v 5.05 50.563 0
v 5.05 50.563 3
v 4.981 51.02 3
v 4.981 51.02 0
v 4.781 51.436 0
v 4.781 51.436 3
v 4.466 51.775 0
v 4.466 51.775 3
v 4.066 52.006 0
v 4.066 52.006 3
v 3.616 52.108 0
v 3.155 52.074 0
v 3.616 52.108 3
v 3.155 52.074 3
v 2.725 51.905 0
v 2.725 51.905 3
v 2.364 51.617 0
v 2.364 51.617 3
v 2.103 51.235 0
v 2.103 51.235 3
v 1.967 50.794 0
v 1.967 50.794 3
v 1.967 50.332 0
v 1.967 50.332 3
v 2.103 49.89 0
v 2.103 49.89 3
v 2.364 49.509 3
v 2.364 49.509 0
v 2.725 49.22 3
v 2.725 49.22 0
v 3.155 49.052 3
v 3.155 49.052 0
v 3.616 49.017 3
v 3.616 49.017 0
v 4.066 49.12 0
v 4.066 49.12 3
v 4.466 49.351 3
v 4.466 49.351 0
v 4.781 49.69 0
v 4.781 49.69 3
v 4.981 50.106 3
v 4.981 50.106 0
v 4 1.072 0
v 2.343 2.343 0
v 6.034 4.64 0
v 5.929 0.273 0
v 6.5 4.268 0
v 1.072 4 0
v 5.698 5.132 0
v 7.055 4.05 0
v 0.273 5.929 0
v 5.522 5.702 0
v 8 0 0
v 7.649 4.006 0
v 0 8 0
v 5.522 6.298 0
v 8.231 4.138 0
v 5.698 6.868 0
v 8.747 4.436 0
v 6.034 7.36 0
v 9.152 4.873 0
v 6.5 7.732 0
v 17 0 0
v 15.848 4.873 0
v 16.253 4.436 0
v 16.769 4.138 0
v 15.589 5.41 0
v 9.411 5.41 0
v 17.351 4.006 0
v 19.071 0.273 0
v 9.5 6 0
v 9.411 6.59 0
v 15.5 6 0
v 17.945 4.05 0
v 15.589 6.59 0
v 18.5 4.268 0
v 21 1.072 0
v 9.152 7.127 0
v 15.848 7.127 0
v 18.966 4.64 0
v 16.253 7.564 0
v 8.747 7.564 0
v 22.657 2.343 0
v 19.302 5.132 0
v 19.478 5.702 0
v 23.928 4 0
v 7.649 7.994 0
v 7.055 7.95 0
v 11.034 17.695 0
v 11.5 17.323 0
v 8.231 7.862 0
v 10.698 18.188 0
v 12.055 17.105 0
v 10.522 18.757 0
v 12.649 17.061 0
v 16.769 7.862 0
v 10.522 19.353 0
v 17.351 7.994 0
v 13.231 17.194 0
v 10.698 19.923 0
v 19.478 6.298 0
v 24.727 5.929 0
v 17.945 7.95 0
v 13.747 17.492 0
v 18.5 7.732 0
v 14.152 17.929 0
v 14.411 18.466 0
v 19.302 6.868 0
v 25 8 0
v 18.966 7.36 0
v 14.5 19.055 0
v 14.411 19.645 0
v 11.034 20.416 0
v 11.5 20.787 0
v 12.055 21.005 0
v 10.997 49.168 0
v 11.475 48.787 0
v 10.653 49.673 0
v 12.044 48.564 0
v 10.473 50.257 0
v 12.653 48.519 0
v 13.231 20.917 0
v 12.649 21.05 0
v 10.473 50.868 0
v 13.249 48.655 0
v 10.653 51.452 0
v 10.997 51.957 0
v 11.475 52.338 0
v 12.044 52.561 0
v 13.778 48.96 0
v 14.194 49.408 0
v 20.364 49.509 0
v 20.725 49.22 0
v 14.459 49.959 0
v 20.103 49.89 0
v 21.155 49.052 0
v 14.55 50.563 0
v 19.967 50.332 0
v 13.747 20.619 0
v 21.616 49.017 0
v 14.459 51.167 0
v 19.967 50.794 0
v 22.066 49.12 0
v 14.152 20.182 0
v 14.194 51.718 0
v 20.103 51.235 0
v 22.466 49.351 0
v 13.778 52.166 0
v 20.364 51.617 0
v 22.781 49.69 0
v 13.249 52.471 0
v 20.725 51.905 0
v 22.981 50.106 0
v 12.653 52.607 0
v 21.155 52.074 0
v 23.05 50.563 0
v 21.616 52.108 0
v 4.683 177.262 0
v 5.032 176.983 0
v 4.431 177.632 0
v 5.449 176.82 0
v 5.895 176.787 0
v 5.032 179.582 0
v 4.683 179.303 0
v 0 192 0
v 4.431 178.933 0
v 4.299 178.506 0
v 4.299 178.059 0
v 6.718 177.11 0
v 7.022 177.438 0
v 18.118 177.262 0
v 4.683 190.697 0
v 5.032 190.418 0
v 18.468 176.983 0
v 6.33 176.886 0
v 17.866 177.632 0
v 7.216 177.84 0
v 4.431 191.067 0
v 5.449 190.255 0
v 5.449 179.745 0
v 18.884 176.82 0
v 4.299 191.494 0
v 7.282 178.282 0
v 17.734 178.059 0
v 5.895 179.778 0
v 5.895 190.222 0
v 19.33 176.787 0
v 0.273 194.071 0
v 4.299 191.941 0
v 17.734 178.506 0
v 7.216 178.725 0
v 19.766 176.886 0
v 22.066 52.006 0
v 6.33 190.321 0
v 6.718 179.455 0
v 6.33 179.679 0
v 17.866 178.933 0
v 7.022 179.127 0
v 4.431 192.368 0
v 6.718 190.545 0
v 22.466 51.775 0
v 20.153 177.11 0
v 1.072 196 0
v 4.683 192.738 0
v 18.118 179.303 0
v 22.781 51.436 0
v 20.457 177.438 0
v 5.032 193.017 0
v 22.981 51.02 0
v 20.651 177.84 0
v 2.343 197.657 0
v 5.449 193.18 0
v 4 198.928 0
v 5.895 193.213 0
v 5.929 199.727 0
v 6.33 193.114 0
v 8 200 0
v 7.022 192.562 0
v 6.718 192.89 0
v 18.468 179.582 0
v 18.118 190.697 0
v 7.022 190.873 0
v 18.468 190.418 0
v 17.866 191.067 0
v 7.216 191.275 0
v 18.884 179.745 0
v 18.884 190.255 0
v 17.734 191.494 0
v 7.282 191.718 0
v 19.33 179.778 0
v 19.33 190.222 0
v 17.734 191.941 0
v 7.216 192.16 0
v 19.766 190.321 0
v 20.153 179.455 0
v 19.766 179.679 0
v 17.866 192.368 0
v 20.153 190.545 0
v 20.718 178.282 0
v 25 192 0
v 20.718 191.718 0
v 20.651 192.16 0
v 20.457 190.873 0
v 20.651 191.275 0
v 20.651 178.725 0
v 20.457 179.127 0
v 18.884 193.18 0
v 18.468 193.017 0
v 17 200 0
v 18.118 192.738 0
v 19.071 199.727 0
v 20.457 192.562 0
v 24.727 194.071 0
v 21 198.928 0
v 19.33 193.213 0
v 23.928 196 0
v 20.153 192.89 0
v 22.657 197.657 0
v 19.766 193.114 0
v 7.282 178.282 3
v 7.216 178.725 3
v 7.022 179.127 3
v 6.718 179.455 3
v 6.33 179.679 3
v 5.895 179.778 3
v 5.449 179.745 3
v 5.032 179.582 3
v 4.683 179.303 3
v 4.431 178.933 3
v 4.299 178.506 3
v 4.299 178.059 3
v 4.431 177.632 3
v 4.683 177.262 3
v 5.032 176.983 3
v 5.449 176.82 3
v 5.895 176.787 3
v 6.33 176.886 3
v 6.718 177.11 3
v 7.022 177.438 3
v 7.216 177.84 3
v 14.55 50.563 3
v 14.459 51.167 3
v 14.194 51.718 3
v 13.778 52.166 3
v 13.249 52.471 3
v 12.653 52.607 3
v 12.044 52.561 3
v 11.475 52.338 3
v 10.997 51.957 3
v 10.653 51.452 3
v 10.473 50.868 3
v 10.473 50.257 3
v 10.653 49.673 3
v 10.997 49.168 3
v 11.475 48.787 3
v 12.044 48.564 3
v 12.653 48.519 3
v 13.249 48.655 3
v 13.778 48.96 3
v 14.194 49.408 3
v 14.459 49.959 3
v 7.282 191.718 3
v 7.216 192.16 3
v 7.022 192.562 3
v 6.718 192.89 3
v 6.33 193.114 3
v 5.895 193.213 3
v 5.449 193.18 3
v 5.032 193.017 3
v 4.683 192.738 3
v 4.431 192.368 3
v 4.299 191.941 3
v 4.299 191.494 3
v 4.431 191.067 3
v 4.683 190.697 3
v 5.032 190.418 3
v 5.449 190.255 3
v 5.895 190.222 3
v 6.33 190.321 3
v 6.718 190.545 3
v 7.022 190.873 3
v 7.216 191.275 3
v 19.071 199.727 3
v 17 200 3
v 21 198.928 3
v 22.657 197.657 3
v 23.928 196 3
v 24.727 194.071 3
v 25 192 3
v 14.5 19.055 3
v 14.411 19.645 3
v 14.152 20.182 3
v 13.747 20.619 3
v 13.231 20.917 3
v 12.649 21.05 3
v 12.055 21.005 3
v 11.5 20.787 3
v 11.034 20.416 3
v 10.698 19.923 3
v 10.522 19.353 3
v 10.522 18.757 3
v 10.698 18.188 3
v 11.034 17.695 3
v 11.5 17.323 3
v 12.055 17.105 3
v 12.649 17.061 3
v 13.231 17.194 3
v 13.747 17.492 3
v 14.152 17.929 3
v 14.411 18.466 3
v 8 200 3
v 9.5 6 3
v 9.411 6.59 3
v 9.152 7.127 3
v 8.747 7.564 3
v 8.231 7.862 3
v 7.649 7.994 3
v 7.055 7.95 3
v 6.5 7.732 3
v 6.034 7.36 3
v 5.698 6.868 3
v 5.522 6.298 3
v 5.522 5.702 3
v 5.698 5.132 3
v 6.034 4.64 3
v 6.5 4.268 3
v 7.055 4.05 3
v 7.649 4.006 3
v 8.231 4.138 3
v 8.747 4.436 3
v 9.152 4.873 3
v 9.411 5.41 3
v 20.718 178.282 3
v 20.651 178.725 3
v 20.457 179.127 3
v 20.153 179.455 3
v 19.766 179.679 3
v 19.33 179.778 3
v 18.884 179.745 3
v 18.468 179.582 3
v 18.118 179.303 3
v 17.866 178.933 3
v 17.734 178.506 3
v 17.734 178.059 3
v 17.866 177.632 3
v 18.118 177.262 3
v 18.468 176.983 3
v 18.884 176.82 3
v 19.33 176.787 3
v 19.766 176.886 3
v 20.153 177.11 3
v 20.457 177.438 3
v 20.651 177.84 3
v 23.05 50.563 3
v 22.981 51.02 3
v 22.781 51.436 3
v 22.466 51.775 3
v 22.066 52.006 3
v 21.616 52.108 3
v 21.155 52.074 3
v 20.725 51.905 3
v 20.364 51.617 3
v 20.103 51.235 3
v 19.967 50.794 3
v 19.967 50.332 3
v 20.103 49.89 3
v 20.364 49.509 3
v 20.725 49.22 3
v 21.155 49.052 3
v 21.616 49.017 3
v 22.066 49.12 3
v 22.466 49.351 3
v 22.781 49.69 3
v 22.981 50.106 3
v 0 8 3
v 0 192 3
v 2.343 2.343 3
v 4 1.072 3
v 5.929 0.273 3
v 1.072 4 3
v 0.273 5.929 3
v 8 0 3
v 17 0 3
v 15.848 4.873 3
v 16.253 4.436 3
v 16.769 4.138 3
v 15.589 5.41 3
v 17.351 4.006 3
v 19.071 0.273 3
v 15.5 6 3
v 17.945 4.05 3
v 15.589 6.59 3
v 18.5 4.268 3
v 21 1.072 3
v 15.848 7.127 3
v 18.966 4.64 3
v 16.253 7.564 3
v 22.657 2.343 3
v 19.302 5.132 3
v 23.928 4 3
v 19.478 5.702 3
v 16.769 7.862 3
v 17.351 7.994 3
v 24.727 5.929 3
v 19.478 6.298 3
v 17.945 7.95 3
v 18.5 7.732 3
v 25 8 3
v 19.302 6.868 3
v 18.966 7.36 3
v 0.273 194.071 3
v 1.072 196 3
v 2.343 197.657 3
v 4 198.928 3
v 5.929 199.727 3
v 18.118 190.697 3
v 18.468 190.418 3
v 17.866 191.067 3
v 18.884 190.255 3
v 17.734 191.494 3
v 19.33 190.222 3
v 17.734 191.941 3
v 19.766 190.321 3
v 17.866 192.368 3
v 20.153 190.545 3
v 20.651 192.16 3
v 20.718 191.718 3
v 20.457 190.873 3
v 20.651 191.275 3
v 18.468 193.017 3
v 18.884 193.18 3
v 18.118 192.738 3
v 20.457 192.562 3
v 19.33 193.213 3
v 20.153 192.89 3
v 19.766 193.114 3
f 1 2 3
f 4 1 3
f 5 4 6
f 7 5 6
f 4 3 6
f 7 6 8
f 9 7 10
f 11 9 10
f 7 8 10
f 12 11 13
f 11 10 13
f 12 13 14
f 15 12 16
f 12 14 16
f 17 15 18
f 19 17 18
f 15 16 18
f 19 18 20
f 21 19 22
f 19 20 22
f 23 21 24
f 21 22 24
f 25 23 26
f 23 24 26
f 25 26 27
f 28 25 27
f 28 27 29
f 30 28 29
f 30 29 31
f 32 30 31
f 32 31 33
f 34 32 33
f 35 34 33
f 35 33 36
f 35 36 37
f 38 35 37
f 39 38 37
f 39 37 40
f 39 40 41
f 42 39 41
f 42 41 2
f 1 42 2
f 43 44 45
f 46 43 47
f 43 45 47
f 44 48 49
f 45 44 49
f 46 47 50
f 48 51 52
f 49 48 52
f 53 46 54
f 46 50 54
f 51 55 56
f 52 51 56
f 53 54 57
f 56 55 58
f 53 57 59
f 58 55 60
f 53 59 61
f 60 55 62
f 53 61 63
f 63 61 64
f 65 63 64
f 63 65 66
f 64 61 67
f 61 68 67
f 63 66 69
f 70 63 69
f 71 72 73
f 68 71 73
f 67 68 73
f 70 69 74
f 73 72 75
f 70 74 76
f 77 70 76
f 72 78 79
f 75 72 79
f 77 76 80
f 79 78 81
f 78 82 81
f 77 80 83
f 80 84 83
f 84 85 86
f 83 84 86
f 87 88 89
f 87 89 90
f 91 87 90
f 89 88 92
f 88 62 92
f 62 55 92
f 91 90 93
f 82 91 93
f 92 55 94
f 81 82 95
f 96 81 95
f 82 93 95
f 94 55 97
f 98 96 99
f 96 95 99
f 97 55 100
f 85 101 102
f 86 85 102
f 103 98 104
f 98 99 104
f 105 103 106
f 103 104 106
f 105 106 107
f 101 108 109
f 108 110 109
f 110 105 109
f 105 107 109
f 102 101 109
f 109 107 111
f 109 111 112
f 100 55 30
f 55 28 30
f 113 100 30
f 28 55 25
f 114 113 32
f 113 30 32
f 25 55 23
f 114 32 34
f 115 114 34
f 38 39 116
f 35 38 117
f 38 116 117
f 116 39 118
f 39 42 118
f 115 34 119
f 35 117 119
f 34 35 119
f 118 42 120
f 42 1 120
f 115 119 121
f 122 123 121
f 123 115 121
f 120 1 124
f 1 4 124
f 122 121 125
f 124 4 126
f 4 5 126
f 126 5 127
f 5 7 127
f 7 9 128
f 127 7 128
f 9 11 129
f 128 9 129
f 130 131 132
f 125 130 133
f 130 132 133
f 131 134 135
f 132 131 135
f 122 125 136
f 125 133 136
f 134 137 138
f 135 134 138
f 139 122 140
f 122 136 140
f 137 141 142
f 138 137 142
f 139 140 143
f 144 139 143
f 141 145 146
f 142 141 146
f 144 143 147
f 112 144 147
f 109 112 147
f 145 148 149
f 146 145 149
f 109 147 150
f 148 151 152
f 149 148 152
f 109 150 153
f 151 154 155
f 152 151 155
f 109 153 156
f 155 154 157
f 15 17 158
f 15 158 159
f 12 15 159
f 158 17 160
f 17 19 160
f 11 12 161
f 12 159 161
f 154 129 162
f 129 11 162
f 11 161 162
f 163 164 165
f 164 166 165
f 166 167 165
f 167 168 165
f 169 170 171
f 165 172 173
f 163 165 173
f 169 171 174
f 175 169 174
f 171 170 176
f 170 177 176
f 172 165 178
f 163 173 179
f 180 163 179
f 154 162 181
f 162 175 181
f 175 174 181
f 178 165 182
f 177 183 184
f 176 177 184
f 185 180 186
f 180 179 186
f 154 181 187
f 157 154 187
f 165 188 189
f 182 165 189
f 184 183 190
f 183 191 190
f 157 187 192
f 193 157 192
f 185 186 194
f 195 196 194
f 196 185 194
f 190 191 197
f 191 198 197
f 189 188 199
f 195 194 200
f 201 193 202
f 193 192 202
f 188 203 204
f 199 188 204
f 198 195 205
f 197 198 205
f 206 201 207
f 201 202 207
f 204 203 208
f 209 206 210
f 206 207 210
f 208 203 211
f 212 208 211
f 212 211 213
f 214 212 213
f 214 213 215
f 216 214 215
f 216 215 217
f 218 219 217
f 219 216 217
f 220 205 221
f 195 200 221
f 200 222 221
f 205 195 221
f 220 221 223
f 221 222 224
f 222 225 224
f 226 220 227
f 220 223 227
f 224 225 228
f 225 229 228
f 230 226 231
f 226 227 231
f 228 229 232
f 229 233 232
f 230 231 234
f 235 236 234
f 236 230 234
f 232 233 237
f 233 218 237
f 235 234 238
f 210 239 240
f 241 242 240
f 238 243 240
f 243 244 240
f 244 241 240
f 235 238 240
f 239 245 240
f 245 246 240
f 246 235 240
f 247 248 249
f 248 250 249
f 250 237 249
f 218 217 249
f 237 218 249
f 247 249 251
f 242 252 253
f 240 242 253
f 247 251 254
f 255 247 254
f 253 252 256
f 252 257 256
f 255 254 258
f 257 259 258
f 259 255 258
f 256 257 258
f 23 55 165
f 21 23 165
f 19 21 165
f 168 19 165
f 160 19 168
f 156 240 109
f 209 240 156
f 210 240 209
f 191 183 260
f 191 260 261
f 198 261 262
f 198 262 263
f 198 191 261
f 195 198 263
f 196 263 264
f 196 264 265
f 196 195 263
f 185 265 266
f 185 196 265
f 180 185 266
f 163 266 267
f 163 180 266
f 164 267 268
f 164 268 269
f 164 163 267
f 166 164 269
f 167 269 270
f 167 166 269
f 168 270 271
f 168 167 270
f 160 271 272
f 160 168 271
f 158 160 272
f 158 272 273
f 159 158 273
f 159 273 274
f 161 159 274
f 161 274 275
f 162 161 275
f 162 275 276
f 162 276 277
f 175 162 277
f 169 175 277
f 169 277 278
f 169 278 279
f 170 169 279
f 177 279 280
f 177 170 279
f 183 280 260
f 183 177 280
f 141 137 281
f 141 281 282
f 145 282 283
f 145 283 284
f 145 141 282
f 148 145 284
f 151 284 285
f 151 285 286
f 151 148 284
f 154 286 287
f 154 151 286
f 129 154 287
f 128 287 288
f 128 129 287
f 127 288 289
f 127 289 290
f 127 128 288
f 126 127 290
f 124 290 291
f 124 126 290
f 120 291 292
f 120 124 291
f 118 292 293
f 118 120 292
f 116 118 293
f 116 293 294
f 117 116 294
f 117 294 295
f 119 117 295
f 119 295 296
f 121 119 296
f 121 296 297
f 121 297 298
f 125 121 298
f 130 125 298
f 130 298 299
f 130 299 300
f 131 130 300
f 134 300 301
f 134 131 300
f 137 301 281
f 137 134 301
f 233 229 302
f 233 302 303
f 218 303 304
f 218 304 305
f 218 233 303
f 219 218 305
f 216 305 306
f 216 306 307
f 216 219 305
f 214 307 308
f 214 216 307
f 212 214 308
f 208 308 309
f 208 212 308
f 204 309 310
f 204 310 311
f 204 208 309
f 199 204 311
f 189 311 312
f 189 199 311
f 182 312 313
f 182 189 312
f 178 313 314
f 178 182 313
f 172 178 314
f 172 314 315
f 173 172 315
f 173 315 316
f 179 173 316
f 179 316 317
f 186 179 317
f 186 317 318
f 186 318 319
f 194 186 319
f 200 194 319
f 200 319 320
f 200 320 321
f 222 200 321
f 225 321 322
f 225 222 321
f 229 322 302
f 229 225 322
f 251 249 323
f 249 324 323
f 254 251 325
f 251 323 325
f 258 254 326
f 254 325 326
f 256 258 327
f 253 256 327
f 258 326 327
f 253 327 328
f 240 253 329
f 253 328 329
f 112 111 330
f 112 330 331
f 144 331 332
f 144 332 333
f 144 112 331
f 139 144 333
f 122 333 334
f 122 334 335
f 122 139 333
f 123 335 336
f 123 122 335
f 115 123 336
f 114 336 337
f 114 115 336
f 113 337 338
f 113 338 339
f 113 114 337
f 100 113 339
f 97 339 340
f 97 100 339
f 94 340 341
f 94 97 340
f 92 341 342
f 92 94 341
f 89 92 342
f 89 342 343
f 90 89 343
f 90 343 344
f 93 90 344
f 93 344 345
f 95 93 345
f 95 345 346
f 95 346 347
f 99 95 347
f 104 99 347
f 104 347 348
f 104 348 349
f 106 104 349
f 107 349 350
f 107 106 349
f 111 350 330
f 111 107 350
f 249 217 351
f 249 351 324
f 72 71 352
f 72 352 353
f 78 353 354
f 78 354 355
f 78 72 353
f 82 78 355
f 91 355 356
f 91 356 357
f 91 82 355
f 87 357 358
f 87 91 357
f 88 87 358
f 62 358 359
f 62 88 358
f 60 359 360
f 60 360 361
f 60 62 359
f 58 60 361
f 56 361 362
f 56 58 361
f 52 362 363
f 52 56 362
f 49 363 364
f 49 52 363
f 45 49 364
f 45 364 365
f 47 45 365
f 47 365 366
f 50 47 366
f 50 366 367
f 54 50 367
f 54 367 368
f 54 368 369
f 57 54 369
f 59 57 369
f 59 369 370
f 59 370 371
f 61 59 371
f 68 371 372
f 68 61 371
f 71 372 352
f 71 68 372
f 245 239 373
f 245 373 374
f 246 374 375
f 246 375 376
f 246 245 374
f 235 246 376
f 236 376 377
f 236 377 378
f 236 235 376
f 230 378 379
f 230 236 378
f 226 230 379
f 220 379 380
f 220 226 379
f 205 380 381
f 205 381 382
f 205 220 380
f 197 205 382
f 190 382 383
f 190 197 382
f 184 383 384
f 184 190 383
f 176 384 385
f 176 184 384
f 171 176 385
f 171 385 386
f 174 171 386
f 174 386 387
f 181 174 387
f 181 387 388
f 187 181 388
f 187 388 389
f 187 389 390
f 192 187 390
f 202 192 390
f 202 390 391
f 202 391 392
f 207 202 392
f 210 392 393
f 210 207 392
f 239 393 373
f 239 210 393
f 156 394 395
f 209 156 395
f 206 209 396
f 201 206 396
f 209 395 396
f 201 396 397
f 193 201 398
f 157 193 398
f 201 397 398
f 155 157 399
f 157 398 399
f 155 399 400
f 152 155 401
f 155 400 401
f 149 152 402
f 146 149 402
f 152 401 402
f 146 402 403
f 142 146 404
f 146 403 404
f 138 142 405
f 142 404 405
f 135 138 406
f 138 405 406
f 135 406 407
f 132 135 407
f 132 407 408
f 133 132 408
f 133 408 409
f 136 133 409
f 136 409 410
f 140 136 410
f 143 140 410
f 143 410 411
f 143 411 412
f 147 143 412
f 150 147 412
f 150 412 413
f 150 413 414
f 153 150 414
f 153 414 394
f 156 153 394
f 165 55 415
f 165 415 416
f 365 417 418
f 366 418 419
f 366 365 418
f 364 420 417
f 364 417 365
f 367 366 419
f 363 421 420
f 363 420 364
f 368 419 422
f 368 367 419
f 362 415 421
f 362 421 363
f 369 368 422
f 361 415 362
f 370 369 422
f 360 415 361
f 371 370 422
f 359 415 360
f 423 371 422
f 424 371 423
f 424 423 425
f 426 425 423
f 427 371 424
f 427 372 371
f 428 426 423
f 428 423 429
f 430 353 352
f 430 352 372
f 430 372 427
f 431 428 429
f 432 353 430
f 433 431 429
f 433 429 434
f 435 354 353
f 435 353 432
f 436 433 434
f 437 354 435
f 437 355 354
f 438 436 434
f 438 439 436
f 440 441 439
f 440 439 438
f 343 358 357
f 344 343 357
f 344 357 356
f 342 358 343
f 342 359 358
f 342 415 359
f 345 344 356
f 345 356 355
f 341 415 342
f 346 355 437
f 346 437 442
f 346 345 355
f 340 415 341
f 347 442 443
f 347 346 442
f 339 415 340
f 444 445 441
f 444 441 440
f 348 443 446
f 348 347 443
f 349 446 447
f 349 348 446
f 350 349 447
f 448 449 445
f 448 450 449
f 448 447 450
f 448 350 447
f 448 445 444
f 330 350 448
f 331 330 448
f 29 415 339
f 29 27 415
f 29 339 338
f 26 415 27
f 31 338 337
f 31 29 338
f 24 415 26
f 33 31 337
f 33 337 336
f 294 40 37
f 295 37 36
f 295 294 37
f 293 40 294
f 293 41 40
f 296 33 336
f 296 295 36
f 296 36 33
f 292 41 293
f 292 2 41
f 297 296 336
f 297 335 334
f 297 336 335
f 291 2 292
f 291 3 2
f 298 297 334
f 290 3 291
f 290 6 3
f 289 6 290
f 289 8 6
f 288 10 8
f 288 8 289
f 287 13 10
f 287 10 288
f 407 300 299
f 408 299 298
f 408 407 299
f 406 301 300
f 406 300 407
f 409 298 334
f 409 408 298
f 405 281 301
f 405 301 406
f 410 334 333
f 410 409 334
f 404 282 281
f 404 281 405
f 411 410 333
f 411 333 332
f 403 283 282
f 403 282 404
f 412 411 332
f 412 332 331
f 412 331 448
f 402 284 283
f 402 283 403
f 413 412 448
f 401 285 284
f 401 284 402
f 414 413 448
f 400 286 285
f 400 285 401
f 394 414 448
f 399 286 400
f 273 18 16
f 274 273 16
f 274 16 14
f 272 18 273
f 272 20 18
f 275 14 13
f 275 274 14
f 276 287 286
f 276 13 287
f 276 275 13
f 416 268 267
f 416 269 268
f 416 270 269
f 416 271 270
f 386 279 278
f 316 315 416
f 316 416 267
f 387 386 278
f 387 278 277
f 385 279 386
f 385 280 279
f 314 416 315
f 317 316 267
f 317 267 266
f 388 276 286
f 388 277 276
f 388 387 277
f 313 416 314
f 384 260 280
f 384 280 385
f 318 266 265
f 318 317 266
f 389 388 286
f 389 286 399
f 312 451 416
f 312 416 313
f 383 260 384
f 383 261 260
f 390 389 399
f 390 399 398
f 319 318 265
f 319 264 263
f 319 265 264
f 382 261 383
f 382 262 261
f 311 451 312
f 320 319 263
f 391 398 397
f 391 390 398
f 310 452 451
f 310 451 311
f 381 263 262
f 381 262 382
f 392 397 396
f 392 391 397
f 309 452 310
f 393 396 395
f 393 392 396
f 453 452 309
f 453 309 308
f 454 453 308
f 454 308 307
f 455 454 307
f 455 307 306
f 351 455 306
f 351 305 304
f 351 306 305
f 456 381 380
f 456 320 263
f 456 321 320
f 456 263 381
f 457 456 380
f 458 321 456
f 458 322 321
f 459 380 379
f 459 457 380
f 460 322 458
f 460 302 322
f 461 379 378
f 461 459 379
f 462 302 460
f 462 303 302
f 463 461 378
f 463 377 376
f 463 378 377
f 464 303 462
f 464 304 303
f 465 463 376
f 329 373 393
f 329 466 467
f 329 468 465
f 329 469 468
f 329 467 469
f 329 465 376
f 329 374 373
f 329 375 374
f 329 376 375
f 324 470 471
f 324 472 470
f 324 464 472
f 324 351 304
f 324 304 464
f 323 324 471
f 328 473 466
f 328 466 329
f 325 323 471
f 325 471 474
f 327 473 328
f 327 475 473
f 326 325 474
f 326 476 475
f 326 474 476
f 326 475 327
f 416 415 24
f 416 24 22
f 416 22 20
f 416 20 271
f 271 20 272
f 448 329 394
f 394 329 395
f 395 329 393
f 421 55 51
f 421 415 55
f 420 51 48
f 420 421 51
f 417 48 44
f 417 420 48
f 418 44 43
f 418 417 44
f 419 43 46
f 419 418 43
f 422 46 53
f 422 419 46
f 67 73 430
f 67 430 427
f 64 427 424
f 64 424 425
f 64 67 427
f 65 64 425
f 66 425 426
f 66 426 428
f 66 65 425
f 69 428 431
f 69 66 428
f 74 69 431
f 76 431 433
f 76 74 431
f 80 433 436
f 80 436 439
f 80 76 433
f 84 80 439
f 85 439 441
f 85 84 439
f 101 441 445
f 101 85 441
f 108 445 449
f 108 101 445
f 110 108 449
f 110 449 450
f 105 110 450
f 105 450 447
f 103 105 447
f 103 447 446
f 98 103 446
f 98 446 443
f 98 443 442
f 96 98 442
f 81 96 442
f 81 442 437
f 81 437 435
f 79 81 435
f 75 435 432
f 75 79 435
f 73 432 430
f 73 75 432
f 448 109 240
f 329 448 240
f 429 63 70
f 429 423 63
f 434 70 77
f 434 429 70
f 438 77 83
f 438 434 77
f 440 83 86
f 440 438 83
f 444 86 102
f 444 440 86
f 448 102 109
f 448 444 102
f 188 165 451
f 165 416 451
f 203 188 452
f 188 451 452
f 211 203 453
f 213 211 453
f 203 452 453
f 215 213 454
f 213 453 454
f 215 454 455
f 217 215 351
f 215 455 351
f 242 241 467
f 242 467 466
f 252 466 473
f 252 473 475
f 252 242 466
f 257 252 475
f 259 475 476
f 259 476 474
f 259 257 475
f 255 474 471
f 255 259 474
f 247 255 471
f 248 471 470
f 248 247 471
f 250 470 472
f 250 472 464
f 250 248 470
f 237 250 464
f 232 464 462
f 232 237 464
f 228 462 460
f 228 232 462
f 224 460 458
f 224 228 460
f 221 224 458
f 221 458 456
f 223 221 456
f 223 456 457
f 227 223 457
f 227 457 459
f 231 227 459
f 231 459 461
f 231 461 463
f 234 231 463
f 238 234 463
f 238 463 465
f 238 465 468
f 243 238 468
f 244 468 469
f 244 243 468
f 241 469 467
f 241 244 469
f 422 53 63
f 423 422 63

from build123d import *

# Parameters (mm, degrees)
SKETCH_1_W          = 25
SKETCH_1_H          = 200
SKETCH_1_R          = 2
SKETCH_1_R_2        = 1.5
SKETCH_1_R_3        = 2.05
EXTRUDE_1_DEPTH     = 3
FILLET_1_R          = 8
CUT_EXTRUDE_1_REACH = 203.579
SKETCH_3_R          = 1.55


with BuildPart() as part:
    # 草图1 → 凸台-拉伸1 (new body)
    with BuildSketch(Plane.XY):
        with Locations((12.5, 100)):
            Rectangle(SKETCH_1_W, SKETCH_1_H)
        with Locations((7.5, 6)):
            Circle(SKETCH_1_R, mode=Mode.SUBTRACT)
        with Locations(Location((17.5, 6, 0), (0, 0, 180))):
            Circle(SKETCH_1_R, mode=Mode.SUBTRACT)
        with Locations((12.5, 19.055282456)):
            Circle(SKETCH_1_R, mode=Mode.SUBTRACT)
        with Locations((5.782485579, 178.282485579)):
            Circle(SKETCH_1_R_2, mode=Mode.SUBTRACT)
        with Locations((5.782485579, 191.717514421)):
            Circle(SKETCH_1_R_2, mode=Mode.SUBTRACT)
        with Locations((19.217514421, 191.717514421)):
            Circle(SKETCH_1_R_2, mode=Mode.SUBTRACT)
        with Locations((19.217514421, 178.282485579)):
            Circle(SKETCH_1_R_2, mode=Mode.SUBTRACT)
        with Locations((12.5, 50.562827646)):
            Circle(SKETCH_1_R_3, mode=Mode.SUBTRACT)
    extrude(amount=EXTRUDE_1_DEPTH)

    # 圆角1
    fillet_1_edges = [part.edges().sort_by_distance(p)[0] for p in [
        (0, 200, 1.5),
        (25, 200, 1.5),
        (25, 0, 1.5),
        (0, 0, 1.5),
    ]]
    fillet(fillet_1_edges, radius=FILLET_1_R)

    # 草图3 → 切除-拉伸1 (cut, up to next)
    with BuildSketch(Plane.XY.offset(3), mode=Mode.PRIVATE) as cut_extrude_1_sk1:
        with Locations((21.5, 50.562827646)):
            Circle(SKETCH_3_R)
    cut_extrude_1_tool1 = extrude(cut_extrude_1_sk1.sketch, amount=-CUT_EXTRUDE_1_REACH, mode=Mode.PRIVATE) & part.part
    # 草图3 → 切除-拉伸1 (cut, up to next)
    with BuildSketch(Plane.XY.offset(3), mode=Mode.PRIVATE) as cut_extrude_1_sk2:
        with Locations((3.5, 50.562827646)):
            Circle(SKETCH_3_R)
    cut_extrude_1_tool2 = extrude(cut_extrude_1_sk2.sketch, amount=-CUT_EXTRUDE_1_REACH, mode=Mode.PRIVATE) & part.part
    add(cut_extrude_1_tool1.solids().sort_by_distance((21.5, 50.562828, 3))[0], mode=Mode.SUBTRACT)
    add(cut_extrude_1_tool2.solids().sort_by_distance((3.5, 50.562828, 3))[0], mode=Mode.SUBTRACT)


solid = part.part
